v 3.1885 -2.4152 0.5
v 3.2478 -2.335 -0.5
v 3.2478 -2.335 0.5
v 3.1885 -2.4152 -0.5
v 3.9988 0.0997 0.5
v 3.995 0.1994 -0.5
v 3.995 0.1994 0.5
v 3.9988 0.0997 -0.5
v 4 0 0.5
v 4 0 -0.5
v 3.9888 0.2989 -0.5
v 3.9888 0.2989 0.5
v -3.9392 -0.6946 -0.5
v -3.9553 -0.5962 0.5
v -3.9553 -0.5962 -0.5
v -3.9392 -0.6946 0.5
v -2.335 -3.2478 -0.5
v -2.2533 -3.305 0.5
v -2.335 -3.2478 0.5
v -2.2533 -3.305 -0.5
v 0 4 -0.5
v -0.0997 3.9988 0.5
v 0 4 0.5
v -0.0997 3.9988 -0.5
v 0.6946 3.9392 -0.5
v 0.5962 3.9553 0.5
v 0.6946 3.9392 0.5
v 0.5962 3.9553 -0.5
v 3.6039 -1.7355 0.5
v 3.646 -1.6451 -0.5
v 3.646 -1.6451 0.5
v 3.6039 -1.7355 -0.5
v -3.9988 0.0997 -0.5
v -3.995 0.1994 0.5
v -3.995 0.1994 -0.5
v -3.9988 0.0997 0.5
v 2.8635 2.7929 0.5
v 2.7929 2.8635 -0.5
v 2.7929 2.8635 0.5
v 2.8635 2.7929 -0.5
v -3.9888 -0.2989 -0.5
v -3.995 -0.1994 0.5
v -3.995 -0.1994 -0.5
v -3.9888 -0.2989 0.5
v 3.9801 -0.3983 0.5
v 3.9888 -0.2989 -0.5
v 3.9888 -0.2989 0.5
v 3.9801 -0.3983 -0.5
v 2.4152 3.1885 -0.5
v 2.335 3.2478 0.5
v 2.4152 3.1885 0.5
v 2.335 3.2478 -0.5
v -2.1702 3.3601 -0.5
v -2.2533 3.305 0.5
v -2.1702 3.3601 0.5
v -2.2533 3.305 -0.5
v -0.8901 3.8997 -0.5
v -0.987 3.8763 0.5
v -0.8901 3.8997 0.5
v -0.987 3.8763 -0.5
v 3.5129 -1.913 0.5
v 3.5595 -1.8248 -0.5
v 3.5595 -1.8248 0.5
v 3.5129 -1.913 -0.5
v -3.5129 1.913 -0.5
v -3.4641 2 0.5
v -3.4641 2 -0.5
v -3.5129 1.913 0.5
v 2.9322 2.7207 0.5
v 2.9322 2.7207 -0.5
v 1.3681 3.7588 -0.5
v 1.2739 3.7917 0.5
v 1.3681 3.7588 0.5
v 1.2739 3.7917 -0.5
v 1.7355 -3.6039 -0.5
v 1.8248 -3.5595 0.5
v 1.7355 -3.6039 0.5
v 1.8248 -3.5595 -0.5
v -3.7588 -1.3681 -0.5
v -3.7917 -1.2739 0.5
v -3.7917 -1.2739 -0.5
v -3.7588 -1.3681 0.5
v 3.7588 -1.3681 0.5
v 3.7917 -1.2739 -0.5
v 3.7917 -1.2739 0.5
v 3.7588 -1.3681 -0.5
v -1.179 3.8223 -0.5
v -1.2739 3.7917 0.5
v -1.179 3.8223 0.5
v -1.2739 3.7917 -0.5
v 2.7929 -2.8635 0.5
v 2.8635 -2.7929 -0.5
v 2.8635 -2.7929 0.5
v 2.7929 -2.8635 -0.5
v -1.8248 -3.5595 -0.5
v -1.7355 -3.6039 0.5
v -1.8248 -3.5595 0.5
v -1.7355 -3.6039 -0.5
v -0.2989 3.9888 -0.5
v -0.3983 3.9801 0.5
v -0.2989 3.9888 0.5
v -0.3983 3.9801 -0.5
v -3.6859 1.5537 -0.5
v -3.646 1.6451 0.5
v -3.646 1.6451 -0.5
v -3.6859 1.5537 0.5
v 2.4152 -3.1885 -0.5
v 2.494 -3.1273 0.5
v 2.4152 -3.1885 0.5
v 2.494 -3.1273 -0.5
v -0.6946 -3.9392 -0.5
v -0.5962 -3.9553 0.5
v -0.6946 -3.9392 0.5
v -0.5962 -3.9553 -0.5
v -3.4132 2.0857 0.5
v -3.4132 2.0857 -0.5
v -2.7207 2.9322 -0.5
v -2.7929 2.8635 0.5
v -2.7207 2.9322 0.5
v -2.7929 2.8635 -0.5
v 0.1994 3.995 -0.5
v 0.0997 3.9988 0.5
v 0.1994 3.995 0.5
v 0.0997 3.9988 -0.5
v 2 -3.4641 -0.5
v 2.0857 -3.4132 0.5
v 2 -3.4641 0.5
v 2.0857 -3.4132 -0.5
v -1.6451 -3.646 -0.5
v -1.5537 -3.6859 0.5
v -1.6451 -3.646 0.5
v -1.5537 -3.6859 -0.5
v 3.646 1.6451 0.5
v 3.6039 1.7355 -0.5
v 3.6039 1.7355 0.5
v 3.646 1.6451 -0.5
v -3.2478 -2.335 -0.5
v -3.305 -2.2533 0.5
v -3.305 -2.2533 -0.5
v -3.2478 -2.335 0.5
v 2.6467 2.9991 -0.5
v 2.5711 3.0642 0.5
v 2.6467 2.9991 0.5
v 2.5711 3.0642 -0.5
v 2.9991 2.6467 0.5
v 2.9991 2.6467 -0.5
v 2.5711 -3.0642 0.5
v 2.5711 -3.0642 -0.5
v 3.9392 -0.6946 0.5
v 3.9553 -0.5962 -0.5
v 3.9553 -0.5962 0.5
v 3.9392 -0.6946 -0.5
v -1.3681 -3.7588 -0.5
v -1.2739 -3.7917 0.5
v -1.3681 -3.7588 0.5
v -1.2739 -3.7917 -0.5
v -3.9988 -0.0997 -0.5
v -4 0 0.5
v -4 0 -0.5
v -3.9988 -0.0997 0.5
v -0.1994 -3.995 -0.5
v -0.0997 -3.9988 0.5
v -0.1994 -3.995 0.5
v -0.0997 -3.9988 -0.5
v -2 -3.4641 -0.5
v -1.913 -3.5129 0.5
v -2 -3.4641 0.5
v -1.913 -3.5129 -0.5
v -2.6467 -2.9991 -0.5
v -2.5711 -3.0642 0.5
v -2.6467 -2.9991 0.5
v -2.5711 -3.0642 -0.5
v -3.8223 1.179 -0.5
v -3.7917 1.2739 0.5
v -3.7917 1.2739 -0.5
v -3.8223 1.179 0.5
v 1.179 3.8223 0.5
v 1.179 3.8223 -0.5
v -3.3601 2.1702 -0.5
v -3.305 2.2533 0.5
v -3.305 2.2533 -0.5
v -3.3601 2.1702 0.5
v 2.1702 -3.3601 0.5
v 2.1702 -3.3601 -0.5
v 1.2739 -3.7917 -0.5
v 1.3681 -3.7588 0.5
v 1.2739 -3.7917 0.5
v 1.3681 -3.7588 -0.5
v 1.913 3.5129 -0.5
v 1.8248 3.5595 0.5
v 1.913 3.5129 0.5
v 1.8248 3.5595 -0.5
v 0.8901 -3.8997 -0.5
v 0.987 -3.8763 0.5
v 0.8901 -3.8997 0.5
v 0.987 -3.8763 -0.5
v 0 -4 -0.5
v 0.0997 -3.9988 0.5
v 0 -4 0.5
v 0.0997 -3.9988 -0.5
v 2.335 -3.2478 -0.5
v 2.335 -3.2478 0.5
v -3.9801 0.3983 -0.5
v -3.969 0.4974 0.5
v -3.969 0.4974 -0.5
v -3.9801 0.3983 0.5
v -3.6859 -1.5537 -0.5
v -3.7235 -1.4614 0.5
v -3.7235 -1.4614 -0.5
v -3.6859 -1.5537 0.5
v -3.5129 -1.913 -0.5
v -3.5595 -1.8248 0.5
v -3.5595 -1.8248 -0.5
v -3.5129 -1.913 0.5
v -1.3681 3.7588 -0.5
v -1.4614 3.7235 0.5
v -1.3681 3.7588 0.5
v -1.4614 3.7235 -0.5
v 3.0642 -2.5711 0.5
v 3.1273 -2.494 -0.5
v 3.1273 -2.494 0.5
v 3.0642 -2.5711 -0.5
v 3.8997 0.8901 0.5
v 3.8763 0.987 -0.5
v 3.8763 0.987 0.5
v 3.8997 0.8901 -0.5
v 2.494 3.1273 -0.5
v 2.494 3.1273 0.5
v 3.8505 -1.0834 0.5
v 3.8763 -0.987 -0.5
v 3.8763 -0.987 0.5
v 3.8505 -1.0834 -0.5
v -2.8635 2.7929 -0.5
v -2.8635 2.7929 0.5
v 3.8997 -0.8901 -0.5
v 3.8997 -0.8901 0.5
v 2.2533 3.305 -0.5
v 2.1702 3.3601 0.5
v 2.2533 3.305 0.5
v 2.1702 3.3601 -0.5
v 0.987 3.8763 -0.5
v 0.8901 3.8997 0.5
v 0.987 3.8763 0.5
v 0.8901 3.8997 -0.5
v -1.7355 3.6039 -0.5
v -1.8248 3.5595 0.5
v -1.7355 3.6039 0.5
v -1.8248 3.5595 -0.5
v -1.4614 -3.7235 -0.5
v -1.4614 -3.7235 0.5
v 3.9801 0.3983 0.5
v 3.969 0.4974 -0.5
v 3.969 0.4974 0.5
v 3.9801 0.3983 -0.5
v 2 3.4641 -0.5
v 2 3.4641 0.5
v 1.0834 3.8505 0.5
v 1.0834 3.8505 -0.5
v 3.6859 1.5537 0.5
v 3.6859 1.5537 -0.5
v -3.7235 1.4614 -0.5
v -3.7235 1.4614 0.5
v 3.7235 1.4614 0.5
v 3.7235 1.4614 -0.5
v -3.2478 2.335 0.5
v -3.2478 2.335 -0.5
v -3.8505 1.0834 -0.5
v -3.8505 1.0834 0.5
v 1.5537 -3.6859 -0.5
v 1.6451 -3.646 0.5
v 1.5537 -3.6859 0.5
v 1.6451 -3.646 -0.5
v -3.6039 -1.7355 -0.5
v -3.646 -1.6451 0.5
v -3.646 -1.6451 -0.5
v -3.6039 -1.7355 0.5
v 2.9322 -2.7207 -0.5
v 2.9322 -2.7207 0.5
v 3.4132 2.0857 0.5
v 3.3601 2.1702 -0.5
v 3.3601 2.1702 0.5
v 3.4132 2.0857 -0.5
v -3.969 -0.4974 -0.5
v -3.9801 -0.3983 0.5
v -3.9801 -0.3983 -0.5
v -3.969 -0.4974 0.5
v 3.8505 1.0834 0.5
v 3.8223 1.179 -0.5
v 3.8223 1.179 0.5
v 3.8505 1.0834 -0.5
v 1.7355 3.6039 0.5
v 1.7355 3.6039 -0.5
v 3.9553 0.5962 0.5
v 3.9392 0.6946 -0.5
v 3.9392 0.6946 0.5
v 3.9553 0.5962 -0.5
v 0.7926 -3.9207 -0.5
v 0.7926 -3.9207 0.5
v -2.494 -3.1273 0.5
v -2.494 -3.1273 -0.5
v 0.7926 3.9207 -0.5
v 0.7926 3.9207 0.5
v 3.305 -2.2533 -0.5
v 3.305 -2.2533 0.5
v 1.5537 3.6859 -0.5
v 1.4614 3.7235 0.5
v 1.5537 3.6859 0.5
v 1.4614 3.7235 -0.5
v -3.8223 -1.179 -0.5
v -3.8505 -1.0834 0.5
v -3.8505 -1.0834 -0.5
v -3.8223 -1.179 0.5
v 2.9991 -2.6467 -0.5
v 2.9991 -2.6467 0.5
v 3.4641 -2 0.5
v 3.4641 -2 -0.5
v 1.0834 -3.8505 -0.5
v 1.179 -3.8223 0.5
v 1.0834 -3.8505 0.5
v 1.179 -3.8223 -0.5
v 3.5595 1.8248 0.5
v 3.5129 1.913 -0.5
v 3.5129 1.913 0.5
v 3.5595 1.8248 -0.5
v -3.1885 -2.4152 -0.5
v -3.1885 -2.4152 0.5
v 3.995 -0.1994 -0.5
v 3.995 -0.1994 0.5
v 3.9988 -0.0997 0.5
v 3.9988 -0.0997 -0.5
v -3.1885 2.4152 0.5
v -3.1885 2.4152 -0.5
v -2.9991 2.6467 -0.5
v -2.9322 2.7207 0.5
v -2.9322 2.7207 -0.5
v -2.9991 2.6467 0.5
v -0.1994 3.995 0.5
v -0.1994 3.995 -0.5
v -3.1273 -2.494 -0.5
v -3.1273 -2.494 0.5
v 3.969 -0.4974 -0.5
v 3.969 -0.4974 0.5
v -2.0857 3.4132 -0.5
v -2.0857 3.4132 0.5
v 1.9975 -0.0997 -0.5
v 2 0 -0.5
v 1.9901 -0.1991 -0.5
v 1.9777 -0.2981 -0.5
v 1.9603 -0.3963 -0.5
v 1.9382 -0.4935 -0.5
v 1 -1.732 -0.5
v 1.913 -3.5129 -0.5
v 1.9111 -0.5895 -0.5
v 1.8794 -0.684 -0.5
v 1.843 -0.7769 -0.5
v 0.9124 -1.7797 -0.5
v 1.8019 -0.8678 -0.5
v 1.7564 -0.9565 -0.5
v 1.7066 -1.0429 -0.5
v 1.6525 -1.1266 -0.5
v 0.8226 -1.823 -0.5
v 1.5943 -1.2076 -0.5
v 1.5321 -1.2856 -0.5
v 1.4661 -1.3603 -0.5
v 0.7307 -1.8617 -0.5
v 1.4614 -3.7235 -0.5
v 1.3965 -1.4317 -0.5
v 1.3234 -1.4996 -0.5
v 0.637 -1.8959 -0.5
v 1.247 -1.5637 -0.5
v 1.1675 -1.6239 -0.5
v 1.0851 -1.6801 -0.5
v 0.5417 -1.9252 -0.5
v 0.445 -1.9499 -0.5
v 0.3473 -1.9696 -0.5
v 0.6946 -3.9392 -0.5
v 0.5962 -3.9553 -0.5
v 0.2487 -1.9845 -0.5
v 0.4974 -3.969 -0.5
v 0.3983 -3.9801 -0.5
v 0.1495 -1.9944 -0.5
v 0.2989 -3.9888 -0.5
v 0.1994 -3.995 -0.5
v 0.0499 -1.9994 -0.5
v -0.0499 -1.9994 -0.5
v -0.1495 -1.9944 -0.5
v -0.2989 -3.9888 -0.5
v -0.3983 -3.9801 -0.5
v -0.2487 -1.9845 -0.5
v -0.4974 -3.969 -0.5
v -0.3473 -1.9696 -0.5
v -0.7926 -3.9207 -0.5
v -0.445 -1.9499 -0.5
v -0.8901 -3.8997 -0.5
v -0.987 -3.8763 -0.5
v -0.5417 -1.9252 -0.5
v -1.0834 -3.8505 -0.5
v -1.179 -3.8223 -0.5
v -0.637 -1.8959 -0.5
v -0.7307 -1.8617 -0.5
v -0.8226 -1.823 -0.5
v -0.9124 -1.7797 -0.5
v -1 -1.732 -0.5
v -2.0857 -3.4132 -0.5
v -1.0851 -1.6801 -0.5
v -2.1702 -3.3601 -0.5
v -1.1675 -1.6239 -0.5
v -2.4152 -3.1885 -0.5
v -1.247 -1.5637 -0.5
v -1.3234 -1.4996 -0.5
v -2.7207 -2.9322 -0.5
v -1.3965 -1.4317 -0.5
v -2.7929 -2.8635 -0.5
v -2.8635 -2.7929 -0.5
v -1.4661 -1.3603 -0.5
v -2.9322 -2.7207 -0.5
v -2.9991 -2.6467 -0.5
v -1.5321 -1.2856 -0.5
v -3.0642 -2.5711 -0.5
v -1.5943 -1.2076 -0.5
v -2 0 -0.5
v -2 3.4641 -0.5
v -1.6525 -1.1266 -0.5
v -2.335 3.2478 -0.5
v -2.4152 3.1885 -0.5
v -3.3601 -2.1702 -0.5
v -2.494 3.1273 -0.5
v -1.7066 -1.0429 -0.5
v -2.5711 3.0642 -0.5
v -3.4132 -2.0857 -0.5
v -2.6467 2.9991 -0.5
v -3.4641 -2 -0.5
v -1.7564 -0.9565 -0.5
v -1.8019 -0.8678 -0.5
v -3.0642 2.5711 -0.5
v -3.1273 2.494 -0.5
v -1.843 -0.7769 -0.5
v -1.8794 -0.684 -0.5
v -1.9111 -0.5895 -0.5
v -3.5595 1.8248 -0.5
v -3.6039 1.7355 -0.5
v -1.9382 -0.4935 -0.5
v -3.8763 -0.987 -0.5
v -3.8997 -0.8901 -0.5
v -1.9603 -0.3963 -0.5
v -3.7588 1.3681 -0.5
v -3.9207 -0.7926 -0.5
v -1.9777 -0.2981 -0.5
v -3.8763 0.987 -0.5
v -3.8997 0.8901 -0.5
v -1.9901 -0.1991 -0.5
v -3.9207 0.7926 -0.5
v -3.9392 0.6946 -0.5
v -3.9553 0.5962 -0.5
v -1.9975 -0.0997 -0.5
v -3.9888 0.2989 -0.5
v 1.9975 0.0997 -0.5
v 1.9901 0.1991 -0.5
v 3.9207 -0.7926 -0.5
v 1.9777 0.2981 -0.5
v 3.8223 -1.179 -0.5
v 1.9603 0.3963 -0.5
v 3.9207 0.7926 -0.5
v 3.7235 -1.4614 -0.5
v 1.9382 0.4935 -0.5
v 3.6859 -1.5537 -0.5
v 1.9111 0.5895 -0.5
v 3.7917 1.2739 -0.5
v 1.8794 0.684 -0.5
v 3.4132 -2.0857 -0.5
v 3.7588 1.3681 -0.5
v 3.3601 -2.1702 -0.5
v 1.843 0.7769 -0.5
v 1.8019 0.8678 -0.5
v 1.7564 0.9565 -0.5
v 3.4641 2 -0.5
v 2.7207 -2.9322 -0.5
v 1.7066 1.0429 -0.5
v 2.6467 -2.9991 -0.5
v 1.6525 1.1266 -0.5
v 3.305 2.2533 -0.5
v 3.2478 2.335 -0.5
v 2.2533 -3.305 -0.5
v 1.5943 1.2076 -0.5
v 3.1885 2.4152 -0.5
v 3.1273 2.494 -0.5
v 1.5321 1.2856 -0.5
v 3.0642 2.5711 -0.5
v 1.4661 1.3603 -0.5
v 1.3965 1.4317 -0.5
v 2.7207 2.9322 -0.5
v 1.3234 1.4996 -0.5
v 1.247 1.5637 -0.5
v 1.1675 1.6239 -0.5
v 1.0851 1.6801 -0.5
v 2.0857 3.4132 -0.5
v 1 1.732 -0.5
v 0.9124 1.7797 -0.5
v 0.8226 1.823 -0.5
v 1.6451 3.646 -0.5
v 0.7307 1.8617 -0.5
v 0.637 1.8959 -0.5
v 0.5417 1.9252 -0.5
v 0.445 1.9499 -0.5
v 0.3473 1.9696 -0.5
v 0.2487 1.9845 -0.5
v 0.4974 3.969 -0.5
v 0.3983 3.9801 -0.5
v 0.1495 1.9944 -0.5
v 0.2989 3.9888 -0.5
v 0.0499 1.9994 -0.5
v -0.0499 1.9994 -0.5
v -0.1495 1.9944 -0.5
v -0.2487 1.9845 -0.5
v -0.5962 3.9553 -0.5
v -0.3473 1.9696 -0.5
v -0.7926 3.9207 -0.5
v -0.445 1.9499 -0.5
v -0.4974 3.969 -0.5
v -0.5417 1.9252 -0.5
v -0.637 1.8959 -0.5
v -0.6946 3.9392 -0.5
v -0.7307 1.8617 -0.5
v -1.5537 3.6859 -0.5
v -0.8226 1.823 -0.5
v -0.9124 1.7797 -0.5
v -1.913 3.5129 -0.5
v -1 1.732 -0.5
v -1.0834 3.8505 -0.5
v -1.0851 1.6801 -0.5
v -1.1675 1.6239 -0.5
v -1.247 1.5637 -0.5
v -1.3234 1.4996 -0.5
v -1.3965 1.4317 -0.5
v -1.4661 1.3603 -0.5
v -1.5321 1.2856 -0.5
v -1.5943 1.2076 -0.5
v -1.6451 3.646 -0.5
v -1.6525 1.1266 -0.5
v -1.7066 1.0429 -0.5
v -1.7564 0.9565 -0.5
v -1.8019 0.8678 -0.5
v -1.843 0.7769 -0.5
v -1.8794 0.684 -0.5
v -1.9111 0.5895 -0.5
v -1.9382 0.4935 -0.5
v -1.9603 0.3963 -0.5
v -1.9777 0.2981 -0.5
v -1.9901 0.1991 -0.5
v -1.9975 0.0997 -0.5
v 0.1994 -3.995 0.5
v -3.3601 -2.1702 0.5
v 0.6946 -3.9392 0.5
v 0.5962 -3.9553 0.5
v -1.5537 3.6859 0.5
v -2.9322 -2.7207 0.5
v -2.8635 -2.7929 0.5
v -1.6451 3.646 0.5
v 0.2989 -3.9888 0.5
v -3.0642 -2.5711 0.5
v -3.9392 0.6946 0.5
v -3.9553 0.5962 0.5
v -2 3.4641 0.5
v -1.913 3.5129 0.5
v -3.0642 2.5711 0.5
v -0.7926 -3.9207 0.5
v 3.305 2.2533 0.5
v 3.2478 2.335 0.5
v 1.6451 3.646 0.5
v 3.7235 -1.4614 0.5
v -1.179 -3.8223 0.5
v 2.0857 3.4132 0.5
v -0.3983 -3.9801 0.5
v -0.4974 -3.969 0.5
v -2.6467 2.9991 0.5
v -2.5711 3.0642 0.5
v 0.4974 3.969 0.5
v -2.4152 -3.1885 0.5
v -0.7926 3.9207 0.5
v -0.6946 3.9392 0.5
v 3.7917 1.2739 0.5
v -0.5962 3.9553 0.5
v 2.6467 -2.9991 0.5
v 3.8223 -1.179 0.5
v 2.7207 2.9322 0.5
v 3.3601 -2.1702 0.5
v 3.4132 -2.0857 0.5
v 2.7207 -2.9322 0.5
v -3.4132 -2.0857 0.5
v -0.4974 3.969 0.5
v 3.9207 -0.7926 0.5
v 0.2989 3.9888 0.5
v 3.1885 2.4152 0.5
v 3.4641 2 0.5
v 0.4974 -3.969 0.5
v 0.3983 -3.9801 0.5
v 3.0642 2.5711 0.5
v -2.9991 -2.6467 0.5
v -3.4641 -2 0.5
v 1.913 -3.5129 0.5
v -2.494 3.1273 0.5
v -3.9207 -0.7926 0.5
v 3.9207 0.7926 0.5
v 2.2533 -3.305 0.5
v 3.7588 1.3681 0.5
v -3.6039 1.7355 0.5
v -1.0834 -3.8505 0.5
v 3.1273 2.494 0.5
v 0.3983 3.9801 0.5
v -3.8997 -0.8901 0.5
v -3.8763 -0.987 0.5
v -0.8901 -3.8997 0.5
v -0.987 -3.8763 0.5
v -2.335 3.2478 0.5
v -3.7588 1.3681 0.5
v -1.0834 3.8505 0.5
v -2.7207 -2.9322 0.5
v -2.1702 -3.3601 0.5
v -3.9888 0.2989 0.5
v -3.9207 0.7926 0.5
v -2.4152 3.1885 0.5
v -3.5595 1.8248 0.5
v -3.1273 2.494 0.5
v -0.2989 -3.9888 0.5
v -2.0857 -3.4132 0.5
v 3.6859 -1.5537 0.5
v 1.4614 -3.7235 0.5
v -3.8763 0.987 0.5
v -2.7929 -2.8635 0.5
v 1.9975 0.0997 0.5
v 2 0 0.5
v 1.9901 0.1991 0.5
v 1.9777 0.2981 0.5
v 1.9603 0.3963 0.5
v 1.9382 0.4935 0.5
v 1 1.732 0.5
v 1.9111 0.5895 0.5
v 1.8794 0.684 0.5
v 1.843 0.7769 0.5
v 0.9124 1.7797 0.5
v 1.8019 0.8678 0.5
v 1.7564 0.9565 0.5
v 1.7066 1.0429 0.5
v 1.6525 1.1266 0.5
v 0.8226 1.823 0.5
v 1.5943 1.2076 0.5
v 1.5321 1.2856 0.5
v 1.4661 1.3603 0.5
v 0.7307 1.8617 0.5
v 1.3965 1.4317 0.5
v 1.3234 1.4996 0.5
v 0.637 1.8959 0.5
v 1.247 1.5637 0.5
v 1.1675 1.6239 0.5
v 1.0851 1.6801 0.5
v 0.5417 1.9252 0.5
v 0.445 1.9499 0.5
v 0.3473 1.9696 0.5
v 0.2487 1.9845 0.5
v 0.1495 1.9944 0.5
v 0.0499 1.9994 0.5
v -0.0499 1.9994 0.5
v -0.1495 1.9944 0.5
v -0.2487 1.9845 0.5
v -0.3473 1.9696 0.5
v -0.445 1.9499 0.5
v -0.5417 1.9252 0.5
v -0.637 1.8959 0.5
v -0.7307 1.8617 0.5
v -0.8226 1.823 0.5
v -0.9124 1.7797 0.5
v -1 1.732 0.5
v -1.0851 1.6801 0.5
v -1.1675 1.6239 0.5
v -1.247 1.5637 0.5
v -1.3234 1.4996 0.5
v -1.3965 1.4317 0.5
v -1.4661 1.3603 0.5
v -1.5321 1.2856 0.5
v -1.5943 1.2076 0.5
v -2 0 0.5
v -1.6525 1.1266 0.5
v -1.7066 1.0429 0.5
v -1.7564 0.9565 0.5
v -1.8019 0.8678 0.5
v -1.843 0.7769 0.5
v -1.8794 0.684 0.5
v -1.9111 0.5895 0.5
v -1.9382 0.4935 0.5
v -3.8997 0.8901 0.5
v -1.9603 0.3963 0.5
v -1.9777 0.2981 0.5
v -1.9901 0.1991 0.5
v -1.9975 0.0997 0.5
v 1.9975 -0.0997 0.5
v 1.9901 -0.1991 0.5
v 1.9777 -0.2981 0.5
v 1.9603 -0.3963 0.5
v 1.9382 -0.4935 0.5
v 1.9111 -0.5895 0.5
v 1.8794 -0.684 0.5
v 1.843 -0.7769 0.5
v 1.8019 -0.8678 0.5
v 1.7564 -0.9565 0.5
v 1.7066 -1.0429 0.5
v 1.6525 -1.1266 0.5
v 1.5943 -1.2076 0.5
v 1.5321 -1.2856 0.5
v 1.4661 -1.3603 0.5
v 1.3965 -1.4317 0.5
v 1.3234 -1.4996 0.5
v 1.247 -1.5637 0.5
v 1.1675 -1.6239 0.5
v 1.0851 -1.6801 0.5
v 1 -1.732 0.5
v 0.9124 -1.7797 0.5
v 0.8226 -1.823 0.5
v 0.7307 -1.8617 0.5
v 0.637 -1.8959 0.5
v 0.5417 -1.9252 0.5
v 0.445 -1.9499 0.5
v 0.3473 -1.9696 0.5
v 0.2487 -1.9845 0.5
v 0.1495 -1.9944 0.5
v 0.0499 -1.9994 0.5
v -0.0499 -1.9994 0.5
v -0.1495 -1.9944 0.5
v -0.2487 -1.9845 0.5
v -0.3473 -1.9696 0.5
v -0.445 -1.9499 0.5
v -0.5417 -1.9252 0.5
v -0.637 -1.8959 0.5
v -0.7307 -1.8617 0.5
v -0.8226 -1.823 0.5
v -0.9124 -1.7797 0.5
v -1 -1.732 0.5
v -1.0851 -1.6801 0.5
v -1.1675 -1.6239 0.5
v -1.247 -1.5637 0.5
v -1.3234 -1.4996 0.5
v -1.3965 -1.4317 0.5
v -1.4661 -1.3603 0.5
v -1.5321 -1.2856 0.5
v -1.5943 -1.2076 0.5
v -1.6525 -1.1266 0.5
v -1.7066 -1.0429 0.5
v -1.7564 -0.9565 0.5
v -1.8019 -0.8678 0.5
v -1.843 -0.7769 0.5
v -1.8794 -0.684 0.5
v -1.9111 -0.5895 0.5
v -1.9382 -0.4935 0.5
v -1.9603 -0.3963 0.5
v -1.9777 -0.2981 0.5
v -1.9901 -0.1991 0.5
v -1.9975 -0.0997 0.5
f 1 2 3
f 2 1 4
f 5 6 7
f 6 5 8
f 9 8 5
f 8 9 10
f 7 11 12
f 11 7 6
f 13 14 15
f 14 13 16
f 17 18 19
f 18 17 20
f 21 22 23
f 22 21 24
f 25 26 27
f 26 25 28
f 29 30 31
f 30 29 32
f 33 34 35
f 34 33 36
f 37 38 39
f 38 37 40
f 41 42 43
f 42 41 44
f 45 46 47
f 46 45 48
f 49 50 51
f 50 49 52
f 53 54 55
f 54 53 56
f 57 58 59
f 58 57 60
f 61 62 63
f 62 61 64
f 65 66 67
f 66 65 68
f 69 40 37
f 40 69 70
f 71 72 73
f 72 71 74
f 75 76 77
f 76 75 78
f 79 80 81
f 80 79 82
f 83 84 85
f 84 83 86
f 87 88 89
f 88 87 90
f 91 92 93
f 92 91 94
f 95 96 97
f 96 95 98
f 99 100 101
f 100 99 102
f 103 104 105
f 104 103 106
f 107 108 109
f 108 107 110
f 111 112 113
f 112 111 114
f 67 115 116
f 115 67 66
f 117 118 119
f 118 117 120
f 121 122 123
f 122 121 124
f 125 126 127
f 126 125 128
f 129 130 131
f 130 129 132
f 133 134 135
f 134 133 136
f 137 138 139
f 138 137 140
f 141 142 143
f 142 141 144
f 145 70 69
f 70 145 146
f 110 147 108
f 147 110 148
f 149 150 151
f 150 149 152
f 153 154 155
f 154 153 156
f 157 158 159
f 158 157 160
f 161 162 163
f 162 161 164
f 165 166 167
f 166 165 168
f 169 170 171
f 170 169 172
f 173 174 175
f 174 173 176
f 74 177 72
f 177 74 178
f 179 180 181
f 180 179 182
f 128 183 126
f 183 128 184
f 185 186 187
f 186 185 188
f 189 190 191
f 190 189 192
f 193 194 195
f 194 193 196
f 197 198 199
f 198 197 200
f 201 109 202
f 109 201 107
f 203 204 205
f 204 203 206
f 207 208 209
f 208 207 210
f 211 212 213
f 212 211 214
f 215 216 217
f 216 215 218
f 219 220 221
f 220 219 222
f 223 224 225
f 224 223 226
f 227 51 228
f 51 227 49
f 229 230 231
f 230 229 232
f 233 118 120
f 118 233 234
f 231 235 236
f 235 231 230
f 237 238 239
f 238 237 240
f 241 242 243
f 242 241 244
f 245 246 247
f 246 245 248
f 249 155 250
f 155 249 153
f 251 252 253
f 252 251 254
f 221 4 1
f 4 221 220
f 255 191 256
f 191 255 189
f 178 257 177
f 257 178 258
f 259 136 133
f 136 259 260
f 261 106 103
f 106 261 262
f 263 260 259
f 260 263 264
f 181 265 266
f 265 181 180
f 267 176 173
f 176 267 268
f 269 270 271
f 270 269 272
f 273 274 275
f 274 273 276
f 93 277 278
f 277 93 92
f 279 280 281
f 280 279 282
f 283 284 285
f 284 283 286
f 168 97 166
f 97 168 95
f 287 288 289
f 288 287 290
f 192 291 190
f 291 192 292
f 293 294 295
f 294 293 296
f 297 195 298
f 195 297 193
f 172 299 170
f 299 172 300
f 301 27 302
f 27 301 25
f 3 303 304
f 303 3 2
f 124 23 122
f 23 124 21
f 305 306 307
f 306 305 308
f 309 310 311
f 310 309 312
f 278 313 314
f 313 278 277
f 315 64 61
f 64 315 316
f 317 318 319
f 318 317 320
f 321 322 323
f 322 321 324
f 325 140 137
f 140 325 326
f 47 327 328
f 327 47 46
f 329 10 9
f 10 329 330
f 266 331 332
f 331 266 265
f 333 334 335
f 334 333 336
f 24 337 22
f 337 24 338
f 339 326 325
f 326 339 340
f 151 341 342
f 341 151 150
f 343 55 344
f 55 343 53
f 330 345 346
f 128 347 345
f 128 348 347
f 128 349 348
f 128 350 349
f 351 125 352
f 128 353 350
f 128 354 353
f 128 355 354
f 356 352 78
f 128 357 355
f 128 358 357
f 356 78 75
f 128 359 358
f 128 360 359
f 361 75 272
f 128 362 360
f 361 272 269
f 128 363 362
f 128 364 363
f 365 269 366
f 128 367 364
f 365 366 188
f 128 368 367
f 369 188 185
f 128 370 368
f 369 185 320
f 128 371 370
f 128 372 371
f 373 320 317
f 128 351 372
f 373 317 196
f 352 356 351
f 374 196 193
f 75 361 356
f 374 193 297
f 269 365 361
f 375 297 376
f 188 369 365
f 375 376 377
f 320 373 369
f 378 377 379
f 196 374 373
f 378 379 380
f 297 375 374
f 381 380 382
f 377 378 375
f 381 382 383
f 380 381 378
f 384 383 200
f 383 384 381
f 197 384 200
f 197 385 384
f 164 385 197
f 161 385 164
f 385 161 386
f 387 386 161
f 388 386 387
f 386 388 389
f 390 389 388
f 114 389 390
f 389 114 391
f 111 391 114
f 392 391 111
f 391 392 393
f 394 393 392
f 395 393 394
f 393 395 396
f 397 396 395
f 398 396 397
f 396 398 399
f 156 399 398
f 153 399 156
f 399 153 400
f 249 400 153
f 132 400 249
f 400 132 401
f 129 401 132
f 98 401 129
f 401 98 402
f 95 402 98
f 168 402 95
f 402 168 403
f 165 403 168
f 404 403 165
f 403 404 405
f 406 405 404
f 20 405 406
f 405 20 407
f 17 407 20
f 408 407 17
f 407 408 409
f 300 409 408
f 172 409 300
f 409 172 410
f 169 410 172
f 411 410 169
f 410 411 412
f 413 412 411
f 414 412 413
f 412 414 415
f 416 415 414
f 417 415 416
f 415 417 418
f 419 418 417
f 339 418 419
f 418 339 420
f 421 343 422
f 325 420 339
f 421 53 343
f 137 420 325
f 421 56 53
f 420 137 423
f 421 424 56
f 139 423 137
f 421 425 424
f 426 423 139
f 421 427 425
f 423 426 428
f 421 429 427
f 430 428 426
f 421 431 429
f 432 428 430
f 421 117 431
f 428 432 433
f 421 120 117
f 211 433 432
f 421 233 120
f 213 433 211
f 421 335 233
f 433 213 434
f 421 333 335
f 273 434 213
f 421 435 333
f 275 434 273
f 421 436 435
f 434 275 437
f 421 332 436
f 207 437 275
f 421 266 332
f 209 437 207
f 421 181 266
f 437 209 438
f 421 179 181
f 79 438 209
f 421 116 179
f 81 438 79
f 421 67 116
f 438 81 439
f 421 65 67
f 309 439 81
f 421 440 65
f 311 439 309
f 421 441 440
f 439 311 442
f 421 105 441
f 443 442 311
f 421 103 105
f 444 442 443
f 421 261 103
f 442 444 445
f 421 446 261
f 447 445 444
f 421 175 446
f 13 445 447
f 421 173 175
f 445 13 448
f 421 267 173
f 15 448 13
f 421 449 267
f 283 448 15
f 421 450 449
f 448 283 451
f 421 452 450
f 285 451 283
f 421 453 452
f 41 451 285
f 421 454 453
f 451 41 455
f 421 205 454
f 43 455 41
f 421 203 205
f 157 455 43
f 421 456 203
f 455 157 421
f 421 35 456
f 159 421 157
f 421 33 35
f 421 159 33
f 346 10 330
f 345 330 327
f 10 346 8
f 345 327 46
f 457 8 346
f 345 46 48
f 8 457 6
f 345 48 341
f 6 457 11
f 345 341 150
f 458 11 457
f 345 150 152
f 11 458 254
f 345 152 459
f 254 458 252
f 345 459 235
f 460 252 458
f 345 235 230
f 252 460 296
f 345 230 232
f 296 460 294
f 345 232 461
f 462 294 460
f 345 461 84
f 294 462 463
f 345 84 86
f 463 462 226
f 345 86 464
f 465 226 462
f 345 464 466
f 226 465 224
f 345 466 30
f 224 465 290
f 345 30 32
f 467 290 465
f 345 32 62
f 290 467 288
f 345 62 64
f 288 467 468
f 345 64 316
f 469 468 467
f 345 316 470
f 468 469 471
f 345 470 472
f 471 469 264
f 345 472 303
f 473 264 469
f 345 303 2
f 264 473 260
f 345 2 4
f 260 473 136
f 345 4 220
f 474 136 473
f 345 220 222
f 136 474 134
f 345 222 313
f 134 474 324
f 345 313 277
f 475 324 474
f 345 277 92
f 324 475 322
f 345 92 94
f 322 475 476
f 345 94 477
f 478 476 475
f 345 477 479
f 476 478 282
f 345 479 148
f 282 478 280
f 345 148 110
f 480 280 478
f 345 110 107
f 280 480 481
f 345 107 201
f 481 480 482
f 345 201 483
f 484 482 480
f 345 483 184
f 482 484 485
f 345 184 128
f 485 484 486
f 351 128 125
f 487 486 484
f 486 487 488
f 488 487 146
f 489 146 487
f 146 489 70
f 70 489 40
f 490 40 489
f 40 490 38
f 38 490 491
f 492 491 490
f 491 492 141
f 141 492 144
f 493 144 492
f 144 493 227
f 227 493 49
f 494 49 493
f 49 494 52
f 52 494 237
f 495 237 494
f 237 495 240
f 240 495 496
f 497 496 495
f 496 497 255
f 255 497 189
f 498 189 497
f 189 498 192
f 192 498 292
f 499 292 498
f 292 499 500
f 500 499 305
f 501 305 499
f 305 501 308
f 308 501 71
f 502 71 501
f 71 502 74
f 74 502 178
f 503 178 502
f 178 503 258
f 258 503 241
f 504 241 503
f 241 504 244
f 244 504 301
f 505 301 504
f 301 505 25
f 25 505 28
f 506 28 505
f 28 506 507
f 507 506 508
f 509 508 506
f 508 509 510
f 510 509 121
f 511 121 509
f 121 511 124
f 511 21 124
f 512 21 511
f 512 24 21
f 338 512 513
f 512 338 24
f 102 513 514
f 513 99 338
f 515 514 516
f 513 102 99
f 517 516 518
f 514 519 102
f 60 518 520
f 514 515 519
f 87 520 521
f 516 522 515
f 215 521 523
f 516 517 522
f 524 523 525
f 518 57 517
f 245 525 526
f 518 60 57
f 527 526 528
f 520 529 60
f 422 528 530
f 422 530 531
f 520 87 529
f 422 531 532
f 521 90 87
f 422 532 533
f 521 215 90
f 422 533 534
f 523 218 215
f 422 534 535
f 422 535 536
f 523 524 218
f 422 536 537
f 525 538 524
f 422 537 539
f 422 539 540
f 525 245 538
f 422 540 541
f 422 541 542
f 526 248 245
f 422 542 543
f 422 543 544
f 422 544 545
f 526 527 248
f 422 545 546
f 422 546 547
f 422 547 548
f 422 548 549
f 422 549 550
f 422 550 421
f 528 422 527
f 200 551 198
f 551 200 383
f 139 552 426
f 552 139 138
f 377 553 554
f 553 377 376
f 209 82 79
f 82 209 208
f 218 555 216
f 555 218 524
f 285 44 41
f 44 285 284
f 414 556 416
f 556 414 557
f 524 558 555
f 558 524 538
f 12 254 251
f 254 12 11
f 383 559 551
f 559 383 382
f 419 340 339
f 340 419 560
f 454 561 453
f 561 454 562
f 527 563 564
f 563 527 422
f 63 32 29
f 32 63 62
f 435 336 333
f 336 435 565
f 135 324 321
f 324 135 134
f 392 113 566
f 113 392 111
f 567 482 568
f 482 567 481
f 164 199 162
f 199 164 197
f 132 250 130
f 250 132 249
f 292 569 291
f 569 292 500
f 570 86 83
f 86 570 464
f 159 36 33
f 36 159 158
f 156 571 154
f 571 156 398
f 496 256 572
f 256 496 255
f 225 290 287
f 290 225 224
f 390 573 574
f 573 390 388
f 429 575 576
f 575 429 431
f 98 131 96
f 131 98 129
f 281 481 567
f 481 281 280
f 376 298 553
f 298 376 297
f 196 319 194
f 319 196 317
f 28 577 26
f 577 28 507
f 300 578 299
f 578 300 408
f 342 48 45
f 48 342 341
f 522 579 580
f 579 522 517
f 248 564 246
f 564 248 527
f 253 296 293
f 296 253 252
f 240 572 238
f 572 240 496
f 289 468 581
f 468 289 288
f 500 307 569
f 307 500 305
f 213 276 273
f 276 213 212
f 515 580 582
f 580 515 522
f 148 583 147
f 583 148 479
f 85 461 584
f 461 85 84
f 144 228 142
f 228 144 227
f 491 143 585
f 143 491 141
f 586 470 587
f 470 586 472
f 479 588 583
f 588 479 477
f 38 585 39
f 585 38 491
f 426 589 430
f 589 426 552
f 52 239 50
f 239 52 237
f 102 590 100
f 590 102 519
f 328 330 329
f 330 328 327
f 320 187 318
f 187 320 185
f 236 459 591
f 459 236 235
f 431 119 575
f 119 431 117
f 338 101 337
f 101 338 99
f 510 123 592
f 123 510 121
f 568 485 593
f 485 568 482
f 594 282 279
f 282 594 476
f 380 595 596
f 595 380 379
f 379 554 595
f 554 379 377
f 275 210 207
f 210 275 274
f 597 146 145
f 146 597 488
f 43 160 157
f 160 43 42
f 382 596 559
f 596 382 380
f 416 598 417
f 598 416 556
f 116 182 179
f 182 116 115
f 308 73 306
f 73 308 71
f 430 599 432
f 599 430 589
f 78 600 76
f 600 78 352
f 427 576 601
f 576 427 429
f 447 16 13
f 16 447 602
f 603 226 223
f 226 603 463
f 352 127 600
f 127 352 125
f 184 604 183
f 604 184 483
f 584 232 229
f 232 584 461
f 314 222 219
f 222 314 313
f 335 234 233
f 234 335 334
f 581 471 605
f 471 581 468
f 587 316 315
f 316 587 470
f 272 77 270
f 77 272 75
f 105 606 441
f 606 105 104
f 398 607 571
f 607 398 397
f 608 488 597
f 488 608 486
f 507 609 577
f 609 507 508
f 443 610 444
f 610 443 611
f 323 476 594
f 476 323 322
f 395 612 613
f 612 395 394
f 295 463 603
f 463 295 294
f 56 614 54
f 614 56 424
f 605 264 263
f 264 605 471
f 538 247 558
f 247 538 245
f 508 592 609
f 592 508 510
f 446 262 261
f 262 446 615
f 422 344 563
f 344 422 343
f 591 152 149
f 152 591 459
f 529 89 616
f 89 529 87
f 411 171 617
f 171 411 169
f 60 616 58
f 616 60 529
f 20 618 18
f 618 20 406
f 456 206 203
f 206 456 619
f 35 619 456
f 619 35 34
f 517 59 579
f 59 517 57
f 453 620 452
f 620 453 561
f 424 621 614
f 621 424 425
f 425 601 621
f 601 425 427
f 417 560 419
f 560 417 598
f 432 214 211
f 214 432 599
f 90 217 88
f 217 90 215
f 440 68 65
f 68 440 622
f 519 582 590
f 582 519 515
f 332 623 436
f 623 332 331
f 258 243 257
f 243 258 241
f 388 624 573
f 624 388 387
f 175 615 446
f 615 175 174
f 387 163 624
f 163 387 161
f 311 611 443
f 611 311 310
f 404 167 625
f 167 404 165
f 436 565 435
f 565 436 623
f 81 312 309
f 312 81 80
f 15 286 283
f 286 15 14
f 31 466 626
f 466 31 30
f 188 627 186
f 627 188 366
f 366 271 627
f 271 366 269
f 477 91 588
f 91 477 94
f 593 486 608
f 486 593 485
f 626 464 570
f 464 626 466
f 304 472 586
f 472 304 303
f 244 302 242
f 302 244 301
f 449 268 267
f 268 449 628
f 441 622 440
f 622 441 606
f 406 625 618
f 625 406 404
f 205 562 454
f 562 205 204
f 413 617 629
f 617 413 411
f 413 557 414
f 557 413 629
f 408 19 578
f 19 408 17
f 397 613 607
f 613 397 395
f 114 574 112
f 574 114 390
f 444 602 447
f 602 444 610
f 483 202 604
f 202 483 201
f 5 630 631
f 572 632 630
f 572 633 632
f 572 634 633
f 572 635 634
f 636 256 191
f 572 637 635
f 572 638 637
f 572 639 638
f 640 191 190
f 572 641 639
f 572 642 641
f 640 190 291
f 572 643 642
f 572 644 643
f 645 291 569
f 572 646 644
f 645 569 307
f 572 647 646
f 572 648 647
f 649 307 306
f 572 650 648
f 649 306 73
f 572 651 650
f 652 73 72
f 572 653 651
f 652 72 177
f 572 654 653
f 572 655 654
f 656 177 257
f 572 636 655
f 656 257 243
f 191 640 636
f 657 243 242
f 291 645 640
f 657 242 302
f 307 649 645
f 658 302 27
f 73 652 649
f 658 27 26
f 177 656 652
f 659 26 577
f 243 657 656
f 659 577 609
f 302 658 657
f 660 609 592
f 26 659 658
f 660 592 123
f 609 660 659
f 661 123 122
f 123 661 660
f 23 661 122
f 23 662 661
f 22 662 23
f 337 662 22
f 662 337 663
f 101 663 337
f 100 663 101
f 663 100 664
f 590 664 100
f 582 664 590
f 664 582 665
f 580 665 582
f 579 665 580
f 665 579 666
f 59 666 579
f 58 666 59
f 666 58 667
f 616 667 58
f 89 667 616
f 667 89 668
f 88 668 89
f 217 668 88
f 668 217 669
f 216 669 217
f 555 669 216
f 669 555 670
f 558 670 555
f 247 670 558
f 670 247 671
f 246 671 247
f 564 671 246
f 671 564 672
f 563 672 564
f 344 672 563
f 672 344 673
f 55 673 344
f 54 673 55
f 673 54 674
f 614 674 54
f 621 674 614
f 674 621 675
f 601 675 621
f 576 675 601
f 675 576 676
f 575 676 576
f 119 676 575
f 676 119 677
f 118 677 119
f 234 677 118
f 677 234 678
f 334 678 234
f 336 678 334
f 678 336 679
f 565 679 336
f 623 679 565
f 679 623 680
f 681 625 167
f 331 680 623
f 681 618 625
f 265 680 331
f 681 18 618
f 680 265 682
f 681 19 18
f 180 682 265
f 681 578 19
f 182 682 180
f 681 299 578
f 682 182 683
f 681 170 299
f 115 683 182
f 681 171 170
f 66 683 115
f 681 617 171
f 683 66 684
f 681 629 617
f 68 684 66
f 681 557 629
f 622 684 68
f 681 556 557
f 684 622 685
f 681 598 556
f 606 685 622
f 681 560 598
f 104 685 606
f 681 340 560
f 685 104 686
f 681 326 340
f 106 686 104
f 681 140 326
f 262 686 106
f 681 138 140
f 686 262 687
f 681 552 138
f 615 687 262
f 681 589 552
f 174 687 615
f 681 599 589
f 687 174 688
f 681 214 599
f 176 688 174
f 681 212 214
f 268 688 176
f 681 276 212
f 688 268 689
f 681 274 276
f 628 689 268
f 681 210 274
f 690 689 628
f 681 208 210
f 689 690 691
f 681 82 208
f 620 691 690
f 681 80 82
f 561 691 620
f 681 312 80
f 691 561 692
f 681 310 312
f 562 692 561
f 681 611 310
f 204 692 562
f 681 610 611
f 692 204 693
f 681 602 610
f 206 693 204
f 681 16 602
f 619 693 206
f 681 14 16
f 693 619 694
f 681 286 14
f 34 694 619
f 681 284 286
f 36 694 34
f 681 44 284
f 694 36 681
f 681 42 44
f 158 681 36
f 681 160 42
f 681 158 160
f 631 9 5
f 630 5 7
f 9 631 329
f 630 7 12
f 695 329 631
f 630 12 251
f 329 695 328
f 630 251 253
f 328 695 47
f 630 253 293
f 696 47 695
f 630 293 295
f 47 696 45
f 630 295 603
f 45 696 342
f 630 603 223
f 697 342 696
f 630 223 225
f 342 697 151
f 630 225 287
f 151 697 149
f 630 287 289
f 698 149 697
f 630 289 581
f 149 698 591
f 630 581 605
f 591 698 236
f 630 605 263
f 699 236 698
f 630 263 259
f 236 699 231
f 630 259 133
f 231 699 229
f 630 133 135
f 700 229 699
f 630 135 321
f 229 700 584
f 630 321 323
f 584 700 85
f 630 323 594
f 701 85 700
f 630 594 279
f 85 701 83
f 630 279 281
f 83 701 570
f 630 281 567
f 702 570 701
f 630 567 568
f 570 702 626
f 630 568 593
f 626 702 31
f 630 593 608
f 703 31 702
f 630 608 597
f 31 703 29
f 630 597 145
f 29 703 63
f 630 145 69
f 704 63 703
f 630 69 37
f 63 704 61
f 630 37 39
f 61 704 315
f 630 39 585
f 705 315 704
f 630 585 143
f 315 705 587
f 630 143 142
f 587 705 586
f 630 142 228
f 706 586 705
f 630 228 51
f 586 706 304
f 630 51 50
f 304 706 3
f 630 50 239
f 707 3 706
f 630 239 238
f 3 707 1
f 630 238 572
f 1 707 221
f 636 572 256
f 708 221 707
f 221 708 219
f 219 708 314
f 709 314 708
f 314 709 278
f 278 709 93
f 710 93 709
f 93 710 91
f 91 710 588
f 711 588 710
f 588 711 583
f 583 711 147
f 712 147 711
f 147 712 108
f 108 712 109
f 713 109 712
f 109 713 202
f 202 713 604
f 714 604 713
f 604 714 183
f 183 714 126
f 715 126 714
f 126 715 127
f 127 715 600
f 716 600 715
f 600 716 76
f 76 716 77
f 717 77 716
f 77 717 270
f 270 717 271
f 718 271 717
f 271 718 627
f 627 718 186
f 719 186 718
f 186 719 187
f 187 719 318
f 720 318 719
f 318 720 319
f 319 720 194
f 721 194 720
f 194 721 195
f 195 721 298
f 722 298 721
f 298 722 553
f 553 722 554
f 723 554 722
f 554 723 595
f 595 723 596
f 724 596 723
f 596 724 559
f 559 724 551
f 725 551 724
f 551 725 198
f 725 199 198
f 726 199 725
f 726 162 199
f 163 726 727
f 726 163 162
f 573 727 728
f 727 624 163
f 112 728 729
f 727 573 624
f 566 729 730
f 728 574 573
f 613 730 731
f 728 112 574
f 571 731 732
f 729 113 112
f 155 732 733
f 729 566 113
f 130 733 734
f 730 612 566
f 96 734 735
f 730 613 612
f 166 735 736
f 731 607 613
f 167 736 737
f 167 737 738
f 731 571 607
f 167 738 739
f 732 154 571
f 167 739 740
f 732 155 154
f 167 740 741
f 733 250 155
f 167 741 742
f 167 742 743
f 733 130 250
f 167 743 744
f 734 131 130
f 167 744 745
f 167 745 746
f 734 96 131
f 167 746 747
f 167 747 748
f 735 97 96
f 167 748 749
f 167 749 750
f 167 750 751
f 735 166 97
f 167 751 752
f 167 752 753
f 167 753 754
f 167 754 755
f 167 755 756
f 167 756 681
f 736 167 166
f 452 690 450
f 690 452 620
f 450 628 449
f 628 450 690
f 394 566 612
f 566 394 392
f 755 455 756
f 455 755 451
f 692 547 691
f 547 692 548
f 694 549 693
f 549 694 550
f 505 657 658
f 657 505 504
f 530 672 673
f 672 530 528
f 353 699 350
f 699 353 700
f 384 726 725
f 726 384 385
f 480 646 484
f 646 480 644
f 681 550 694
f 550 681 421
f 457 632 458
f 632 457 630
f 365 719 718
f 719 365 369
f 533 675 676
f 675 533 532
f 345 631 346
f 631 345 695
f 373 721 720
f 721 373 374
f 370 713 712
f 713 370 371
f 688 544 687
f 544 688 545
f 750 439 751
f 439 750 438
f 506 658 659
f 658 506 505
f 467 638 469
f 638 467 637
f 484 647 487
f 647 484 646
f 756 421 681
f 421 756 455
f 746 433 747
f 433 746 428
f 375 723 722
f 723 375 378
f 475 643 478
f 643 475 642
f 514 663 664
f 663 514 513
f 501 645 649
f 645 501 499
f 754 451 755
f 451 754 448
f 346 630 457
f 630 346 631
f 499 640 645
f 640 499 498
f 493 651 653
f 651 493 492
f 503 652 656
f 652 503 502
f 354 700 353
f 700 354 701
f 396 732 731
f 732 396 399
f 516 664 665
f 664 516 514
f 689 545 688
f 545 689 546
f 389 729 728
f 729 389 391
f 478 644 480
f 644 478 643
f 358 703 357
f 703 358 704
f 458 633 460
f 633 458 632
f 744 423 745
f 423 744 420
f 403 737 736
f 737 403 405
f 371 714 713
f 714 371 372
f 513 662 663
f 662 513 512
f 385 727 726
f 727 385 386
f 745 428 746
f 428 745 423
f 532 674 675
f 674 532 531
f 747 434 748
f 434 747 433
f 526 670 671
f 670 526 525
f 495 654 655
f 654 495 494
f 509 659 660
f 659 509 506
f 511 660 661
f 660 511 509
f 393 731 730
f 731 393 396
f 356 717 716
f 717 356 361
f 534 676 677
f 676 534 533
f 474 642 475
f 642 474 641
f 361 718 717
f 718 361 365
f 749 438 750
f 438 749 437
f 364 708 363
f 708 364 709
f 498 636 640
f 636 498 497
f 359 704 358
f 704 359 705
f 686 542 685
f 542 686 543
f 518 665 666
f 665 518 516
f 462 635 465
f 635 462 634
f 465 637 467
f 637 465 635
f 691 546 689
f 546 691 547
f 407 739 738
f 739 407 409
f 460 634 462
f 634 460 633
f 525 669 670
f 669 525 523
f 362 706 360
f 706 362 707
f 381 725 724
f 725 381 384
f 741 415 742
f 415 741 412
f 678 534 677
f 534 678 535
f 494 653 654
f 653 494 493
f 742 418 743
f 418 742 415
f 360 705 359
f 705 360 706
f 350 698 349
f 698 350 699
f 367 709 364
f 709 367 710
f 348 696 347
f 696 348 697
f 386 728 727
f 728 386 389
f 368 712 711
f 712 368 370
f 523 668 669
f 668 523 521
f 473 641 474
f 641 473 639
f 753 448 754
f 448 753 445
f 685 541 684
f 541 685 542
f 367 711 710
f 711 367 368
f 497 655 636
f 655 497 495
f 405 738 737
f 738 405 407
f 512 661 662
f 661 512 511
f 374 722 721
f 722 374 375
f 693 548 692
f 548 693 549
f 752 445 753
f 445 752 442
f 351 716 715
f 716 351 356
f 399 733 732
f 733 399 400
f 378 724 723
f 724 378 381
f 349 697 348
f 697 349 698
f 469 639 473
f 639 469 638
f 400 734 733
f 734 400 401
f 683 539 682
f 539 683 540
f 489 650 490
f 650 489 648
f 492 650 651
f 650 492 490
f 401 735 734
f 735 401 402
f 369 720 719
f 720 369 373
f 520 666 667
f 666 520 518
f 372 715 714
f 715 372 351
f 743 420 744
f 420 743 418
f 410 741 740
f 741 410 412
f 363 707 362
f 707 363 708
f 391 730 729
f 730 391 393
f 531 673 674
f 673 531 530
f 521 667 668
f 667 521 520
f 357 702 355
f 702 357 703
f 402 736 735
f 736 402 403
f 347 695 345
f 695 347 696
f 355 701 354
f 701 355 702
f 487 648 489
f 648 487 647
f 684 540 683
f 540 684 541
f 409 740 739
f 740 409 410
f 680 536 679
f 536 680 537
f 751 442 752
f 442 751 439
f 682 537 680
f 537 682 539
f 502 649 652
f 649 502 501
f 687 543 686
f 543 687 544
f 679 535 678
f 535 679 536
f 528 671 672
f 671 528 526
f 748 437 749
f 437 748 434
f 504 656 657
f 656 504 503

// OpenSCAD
outer_r = 4.0; // mm
width = 1.0; // mm
inner_r = 2.0; // mm

$fa = 1.0;
$fs = 0.1;

difference()
{
    cylinder(h=width, r=outer_r, center=true);
    cylinder(h=width+1.0, r=inner_r, center=true);
}
